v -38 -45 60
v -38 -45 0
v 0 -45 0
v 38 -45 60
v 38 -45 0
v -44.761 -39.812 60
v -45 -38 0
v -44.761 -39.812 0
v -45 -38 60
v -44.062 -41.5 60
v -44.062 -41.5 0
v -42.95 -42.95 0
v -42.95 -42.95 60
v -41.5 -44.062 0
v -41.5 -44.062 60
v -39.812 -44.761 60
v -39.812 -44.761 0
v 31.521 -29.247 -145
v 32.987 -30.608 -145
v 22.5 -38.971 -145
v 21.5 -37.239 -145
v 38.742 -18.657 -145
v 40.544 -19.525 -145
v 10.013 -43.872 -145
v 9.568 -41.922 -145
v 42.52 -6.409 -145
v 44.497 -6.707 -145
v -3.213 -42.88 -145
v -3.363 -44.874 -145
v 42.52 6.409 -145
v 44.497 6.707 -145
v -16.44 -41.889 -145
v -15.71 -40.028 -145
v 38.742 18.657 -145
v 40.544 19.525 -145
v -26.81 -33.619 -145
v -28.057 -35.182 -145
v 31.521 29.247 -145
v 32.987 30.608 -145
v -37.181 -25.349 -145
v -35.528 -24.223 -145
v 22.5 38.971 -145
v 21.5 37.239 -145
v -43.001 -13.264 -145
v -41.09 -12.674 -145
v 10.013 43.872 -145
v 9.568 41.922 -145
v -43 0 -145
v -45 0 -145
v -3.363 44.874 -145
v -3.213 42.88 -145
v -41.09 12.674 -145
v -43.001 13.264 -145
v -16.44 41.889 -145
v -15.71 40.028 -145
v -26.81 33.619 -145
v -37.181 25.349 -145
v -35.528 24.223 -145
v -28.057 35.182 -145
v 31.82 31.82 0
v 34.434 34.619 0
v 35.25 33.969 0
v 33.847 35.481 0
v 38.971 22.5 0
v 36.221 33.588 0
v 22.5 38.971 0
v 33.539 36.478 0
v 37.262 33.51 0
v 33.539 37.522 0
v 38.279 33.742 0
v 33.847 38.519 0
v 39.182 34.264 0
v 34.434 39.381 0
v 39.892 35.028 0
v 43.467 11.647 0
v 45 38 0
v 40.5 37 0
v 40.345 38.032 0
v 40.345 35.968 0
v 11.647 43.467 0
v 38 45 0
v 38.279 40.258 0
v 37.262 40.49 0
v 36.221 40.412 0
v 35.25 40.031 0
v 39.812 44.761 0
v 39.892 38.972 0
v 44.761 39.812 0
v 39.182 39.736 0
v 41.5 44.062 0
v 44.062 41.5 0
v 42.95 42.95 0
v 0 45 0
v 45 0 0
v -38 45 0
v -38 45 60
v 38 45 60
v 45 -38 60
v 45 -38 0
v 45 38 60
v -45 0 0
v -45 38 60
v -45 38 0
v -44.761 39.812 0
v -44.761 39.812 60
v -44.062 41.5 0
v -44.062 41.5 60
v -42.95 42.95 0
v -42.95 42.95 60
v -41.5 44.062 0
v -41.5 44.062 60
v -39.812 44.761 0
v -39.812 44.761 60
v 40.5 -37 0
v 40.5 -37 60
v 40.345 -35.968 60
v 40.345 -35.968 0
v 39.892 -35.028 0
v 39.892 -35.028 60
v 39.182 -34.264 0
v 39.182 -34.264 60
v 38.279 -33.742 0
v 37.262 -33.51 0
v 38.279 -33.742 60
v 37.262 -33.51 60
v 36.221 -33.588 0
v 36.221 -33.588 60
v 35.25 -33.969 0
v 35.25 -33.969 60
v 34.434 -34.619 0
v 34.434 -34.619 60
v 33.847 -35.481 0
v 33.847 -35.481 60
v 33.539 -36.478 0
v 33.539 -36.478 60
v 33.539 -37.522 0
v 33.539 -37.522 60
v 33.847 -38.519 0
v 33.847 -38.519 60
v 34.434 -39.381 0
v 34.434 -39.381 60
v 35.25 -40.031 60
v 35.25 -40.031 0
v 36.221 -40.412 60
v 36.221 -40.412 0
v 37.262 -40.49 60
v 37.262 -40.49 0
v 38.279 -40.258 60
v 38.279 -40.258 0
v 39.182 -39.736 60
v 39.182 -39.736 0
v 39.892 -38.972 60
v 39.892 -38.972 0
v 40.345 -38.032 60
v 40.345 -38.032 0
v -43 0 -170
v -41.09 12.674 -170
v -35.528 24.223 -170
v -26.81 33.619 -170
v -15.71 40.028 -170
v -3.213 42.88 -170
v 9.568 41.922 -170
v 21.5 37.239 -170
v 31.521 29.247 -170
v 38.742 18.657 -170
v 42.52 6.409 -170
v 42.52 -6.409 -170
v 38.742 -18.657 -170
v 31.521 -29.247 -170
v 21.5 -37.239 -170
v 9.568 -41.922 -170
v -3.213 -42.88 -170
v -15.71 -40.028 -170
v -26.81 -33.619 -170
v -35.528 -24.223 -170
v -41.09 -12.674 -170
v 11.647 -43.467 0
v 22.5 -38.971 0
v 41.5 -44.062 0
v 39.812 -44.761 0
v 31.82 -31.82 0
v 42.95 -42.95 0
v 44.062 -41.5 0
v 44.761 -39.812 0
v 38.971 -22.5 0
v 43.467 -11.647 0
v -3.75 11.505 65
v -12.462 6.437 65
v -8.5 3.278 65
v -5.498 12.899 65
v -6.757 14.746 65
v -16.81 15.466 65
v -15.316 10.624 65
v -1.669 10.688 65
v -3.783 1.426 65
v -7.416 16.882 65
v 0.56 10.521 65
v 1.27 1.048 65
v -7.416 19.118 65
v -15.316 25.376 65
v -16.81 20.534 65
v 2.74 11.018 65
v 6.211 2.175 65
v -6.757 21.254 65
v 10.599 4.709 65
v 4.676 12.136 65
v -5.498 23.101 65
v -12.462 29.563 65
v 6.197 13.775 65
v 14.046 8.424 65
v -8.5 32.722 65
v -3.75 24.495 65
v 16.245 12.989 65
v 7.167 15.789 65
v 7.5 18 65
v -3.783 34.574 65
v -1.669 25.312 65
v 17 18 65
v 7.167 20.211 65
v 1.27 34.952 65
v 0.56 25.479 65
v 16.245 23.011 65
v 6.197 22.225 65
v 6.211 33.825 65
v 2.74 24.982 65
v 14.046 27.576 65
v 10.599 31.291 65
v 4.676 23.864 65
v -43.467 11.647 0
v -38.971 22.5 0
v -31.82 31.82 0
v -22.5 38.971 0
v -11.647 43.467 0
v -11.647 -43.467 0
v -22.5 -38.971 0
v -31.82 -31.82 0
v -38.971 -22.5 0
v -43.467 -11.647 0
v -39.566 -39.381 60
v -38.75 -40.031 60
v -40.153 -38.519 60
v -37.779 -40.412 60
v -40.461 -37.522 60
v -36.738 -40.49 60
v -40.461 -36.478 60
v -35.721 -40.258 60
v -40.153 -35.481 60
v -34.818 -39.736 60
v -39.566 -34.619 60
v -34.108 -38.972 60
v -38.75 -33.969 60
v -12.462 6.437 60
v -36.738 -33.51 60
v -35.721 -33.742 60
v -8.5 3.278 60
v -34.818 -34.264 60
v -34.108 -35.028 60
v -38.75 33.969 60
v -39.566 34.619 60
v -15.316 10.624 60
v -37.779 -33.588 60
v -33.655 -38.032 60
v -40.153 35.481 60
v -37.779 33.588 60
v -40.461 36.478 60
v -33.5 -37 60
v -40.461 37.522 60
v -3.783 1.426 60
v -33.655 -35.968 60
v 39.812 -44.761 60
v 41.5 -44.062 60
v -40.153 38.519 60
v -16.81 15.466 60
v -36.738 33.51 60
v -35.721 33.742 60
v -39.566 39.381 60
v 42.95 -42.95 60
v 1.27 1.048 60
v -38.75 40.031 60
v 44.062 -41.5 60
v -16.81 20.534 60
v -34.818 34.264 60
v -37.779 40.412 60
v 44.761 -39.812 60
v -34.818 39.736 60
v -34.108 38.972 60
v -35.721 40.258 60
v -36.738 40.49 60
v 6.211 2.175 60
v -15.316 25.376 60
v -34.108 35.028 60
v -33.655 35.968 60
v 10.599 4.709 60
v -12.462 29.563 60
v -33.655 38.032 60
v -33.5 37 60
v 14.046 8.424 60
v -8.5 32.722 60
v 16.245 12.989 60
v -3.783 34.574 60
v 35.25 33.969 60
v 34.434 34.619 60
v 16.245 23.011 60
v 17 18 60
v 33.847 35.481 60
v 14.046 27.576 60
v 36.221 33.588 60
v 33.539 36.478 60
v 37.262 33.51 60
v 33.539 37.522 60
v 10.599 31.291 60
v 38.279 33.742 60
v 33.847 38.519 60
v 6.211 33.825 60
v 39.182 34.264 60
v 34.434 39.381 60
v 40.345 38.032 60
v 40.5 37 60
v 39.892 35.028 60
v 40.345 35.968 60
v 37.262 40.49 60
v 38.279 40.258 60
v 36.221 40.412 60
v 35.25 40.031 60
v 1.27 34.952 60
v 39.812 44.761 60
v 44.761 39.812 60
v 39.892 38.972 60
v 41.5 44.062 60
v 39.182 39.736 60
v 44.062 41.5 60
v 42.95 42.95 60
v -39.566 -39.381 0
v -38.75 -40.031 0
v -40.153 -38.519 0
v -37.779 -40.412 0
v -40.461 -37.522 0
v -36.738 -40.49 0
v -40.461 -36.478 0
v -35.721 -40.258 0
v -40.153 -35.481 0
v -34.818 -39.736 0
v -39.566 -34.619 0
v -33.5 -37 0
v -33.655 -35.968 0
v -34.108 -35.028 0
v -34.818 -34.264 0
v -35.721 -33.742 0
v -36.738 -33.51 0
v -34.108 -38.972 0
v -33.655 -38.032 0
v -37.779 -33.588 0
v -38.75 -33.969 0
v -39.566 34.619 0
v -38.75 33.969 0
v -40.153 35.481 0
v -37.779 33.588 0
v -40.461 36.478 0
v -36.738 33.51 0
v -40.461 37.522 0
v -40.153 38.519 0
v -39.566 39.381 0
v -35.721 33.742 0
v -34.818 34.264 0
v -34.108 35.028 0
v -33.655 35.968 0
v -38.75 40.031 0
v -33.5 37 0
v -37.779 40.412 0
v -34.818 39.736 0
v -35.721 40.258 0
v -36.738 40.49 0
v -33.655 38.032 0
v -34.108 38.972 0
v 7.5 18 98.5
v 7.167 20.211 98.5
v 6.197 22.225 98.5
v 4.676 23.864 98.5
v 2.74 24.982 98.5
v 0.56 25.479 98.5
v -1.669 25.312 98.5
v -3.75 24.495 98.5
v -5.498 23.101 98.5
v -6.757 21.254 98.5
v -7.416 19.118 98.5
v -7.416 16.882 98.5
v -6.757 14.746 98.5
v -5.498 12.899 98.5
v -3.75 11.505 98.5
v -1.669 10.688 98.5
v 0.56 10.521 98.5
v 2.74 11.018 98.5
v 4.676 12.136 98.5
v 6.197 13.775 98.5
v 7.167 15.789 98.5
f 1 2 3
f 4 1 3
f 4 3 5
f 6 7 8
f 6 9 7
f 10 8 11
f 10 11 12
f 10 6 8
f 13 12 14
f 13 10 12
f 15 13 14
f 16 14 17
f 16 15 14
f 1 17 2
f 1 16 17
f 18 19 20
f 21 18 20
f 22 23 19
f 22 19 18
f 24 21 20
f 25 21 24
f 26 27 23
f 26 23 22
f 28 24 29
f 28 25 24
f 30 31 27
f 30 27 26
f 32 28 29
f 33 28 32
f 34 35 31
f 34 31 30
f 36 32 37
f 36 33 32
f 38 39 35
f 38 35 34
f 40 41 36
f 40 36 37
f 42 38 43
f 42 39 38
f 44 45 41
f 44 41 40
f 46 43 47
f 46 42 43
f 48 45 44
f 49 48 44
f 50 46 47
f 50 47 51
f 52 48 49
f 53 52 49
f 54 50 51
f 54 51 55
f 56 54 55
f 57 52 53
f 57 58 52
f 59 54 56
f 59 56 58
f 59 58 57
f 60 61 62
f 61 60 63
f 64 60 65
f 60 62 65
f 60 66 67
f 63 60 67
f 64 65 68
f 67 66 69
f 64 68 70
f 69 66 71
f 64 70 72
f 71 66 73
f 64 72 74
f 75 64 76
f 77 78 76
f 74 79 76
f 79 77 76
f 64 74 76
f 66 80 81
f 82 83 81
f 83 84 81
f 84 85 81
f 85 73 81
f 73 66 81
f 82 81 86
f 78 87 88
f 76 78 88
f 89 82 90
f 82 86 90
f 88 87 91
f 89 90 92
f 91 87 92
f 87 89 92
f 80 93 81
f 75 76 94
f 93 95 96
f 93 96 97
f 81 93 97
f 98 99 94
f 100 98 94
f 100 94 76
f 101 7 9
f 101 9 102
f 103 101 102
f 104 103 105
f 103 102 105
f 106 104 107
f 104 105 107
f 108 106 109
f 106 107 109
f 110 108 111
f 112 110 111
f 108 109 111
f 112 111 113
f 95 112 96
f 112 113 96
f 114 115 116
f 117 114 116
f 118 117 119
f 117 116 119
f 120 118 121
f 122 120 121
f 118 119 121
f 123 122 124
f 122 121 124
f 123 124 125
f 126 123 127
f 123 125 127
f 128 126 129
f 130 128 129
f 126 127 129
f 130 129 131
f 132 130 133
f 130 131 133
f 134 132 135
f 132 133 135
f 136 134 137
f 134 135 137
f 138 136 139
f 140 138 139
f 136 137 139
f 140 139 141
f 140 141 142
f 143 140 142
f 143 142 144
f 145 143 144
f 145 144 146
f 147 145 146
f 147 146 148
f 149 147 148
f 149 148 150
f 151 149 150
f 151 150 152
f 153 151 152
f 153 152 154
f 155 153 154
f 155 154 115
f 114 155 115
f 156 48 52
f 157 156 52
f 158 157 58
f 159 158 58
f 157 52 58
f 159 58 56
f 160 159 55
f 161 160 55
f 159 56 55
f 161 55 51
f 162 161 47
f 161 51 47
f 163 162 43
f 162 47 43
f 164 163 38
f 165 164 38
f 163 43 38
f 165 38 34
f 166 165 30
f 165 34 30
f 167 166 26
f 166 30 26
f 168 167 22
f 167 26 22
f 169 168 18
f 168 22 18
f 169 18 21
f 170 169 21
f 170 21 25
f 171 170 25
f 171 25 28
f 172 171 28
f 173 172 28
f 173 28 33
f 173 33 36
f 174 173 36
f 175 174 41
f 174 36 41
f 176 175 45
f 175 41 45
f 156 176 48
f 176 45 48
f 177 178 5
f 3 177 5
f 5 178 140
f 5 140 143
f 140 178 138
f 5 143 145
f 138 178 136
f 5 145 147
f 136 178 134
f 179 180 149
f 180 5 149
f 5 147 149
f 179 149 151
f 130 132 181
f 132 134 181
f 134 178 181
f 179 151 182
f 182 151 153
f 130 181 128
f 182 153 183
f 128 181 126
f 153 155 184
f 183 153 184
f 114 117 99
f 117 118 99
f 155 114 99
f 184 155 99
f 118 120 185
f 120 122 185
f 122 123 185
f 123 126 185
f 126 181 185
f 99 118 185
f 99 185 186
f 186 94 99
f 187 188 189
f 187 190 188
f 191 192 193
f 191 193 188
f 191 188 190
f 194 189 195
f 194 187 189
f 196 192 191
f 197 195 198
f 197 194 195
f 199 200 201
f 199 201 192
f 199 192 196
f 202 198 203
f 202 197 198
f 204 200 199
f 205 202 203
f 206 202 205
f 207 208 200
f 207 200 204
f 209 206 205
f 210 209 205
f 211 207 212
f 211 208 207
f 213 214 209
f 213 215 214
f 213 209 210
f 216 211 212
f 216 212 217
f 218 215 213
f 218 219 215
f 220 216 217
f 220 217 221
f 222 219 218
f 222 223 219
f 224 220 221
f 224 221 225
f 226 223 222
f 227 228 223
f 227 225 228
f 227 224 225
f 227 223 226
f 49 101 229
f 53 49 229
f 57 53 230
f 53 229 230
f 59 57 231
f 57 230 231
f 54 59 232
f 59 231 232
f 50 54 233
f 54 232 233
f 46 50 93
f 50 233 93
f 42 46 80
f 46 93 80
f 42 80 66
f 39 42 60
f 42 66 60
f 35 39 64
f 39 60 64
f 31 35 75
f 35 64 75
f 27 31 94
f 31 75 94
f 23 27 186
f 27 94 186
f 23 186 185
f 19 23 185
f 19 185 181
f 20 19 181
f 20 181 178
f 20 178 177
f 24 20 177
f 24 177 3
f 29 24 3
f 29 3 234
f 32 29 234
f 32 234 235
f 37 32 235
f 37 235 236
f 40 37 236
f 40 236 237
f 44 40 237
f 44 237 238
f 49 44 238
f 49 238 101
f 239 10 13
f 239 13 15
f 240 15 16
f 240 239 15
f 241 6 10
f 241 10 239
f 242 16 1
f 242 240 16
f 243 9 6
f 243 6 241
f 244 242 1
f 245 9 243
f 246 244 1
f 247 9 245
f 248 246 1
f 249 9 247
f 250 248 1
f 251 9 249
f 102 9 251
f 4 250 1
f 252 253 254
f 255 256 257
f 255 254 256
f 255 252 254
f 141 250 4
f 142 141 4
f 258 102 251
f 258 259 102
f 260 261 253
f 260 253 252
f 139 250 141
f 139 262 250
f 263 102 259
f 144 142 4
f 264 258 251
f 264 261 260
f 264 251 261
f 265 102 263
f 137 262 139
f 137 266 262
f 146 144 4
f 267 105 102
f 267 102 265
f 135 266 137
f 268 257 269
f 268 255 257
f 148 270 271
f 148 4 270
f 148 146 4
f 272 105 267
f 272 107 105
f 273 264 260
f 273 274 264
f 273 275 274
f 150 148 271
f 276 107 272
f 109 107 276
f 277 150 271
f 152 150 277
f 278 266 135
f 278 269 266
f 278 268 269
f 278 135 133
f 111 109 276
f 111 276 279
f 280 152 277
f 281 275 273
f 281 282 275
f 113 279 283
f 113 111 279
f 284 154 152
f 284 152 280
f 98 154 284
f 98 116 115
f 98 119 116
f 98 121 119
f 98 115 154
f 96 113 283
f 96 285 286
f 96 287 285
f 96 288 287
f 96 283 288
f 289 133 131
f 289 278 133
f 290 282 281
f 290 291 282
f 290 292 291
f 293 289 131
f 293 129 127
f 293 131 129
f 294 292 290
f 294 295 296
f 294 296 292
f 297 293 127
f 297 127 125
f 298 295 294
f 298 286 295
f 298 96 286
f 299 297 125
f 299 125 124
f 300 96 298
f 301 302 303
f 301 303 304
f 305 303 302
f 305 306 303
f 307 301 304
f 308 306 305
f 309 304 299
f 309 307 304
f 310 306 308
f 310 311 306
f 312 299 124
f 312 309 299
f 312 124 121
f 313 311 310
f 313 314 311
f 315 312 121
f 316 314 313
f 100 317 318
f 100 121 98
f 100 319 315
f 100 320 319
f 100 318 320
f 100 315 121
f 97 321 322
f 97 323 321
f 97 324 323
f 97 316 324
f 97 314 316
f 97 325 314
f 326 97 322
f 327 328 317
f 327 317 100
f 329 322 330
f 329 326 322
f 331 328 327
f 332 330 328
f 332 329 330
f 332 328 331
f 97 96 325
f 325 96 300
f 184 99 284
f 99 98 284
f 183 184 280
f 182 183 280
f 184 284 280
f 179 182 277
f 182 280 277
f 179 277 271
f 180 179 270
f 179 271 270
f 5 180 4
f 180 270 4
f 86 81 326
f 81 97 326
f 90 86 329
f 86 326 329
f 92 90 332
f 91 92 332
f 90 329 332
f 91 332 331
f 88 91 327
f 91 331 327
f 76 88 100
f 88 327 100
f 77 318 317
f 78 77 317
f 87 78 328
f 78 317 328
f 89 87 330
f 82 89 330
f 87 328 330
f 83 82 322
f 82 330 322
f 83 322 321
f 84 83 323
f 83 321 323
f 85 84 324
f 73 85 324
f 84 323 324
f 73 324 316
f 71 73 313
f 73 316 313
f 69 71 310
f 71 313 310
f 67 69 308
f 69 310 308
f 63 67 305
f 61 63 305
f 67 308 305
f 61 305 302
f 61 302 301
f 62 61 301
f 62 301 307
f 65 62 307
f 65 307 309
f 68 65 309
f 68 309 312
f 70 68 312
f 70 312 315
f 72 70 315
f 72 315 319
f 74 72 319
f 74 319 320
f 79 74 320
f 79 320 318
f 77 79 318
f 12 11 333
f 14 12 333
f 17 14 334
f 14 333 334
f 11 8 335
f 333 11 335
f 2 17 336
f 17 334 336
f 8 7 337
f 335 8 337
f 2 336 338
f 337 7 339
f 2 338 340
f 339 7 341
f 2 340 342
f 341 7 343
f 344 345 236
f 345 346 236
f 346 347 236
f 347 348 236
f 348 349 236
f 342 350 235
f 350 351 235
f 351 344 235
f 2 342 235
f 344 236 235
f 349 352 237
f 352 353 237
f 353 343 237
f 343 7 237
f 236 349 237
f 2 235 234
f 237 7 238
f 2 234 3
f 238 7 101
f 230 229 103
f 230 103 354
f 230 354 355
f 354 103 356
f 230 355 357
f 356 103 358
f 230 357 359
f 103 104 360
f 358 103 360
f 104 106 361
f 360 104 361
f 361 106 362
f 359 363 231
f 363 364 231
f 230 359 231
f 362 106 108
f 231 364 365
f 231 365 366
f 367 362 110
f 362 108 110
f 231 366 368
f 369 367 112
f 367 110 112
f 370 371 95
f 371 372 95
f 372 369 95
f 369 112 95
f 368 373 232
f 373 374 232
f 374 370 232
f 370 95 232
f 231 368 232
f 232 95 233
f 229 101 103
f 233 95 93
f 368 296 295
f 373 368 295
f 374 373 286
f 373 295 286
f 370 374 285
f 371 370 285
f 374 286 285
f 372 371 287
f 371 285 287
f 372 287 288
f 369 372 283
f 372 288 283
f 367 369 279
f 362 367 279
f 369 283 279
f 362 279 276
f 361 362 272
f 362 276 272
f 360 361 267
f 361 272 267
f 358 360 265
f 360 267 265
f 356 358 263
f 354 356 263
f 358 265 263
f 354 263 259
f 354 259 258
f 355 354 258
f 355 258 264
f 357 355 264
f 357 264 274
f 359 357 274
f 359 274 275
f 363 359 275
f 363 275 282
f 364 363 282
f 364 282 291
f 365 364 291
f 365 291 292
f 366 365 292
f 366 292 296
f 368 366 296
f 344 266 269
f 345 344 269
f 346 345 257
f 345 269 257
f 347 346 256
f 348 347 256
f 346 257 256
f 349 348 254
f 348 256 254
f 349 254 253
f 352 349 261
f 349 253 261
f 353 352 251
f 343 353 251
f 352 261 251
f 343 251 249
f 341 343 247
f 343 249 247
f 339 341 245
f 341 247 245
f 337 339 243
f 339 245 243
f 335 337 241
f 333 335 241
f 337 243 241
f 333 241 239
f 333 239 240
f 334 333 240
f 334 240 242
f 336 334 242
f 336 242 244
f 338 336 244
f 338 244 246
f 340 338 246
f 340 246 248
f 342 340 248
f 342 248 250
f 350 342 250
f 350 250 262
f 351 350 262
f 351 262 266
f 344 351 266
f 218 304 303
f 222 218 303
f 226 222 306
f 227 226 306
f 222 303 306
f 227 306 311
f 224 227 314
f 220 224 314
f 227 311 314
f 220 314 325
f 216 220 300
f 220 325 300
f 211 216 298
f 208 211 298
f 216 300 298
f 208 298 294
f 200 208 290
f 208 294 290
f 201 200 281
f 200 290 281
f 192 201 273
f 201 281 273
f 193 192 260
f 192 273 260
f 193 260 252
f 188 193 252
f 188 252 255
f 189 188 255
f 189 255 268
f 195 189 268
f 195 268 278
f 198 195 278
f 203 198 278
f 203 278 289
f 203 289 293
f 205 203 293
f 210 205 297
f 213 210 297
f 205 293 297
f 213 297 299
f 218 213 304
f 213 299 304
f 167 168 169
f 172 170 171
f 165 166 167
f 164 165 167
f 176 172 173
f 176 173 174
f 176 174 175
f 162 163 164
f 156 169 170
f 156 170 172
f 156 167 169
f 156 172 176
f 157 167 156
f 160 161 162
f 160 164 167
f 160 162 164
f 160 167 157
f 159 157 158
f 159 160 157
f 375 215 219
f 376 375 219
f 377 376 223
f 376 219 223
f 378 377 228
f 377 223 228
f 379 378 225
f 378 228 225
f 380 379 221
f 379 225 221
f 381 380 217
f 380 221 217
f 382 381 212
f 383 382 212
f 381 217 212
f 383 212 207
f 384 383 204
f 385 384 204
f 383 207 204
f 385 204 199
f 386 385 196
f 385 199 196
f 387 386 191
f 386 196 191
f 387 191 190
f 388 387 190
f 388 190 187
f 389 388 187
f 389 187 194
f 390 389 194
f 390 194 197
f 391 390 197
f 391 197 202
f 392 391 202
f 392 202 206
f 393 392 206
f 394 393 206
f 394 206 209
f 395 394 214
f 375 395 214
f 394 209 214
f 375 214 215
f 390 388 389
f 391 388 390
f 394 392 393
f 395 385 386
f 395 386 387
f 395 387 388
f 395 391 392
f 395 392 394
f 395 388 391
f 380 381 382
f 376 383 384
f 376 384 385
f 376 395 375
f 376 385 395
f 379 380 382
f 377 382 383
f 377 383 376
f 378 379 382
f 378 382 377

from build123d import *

# Parameters (mm, degrees)
SKETCH1_W           = 90
SKETCH1_H           = 90
BOSS_EXTRUDE1_DEPTH = 60
SKETCH2_R           = 45
BOSS_EXTRUDE2_DEPTH = 170
SKETCH3_R           = 17
BOSS_EXTRUDE3_DEPTH = 5
SKETCH4_R           = 7.5
BOSS_EXTRUDE4_DEPTH = 33.5
CUT_EXTRUDE1_REACH  = 240.642
SKETCH5_R           = 3.5
FILLET1_R           = 7
CUT_EXTRUDE2_START  = -25
SKETCH6_R           = 45
SKETCH6_R_2         = 43
CUT_EXTRUDE2_DEPTH  = 25


with BuildPart() as part:
    # Sketch1 → Boss-Extrude1 (new body)
    with BuildSketch(Plane.XY):
        Rectangle(SKETCH1_W, SKETCH1_H)
    extrude(amount=BOSS_EXTRUDE1_DEPTH)

    # Sketch2 → Boss-Extrude2 (add)
    with BuildSketch(Plane(origin=(0, 0, 0), x_dir=(-1, 0, 0), z_dir=(0, 0, -1))):
        Circle(SKETCH2_R)
    extrude(amount=BOSS_EXTRUDE2_DEPTH)

    # Sketch3 → Boss-Extrude3 (add)
    with BuildSketch(Plane.XY.offset(60)):
        with Locations((0, 18)):
            Circle(SKETCH3_R)
    extrude(amount=BOSS_EXTRUDE3_DEPTH)

    # Sketch4 → Boss-Extrude4 (add)
    with BuildSketch(Plane.XY.offset(65)):
        with Locations((0, 18)):
            Circle(SKETCH4_R)
    extrude(amount=BOSS_EXTRUDE4_DEPTH)

    # Sketch5 → Cut-Extrude1 (cut, up to next)
    with BuildSketch(Plane.XY.offset(60), mode=Mode.PRIVATE) as cut_extrude1_sk1:
        with Locations((-37, 37)):
            Circle(SKETCH5_R)
    cut_extrude1_tool1 = extrude(cut_extrude1_sk1.sketch, amount=-CUT_EXTRUDE1_REACH, mode=Mode.PRIVATE) & part.part
    # Sketch5 → Cut-Extrude1 (cut, up to next)
    with BuildSketch(Plane.XY.offset(60), mode=Mode.PRIVATE) as cut_extrude1_sk2:
        with Locations((37, 37)):
            Circle(SKETCH5_R)
    cut_extrude1_tool2 = extrude(cut_extrude1_sk2.sketch, amount=-CUT_EXTRUDE1_REACH, mode=Mode.PRIVATE) & part.part
    # Sketch5 → Cut-Extrude1 (cut, up to next)
    with BuildSketch(Plane.XY.offset(60), mode=Mode.PRIVATE) as cut_extrude1_sk3:
        with Locations((37, -37)):
            Circle(SKETCH5_R)
    cut_extrude1_tool3 = extrude(cut_extrude1_sk3.sketch, amount=-CUT_EXTRUDE1_REACH, mode=Mode.PRIVATE) & part.part
    # Sketch5 → Cut-Extrude1 (cut, up to next)
    with BuildSketch(Plane.XY.offset(60), mode=Mode.PRIVATE) as cut_extrude1_sk4:
        with Locations((-37, -37)):
            Circle(SKETCH5_R)
    cut_extrude1_tool4 = extrude(cut_extrude1_sk4.sketch, amount=-CUT_EXTRUDE1_REACH, mode=Mode.PRIVATE) & part.part
    add(cut_extrude1_tool1.solids().sort_by_distance((-37, 37, 60))[0], mode=Mode.SUBTRACT)
    add(cut_extrude1_tool2.solids().sort_by_distance((37, 37, 60))[0], mode=Mode.SUBTRACT)
    add(cut_extrude1_tool3.solids().sort_by_distance((37, -37, 60))[0], mode=Mode.SUBTRACT)
    add(cut_extrude1_tool4.solids().sort_by_distance((-37, -37, 60))[0], mode=Mode.SUBTRACT)

    # Fillet1
    fillet1_edges = [part.edges().sort_by_distance(p)[0] for p in [
        (45, -45, 30),
        (-45, -45, 30),
        (-45, 45, 30),
        (45, 45, 30),
    ]]
    fillet(fillet1_edges, radius=FILLET1_R)

    # Sketch6 → Cut-Extrude2 (cut)
    with BuildSketch(Plane(origin=(0, 0, -170), x_dir=(-1, 0, 0), z_dir=(0, 0, -1)).offset(CUT_EXTRUDE2_START)):
        Circle(SKETCH6_R)
        Circle(SKETCH6_R_2, mode=Mode.SUBTRACT)
    extrude(amount=CUT_EXTRUDE2_DEPTH, mode=Mode.SUBTRACT)


solid = part.part
